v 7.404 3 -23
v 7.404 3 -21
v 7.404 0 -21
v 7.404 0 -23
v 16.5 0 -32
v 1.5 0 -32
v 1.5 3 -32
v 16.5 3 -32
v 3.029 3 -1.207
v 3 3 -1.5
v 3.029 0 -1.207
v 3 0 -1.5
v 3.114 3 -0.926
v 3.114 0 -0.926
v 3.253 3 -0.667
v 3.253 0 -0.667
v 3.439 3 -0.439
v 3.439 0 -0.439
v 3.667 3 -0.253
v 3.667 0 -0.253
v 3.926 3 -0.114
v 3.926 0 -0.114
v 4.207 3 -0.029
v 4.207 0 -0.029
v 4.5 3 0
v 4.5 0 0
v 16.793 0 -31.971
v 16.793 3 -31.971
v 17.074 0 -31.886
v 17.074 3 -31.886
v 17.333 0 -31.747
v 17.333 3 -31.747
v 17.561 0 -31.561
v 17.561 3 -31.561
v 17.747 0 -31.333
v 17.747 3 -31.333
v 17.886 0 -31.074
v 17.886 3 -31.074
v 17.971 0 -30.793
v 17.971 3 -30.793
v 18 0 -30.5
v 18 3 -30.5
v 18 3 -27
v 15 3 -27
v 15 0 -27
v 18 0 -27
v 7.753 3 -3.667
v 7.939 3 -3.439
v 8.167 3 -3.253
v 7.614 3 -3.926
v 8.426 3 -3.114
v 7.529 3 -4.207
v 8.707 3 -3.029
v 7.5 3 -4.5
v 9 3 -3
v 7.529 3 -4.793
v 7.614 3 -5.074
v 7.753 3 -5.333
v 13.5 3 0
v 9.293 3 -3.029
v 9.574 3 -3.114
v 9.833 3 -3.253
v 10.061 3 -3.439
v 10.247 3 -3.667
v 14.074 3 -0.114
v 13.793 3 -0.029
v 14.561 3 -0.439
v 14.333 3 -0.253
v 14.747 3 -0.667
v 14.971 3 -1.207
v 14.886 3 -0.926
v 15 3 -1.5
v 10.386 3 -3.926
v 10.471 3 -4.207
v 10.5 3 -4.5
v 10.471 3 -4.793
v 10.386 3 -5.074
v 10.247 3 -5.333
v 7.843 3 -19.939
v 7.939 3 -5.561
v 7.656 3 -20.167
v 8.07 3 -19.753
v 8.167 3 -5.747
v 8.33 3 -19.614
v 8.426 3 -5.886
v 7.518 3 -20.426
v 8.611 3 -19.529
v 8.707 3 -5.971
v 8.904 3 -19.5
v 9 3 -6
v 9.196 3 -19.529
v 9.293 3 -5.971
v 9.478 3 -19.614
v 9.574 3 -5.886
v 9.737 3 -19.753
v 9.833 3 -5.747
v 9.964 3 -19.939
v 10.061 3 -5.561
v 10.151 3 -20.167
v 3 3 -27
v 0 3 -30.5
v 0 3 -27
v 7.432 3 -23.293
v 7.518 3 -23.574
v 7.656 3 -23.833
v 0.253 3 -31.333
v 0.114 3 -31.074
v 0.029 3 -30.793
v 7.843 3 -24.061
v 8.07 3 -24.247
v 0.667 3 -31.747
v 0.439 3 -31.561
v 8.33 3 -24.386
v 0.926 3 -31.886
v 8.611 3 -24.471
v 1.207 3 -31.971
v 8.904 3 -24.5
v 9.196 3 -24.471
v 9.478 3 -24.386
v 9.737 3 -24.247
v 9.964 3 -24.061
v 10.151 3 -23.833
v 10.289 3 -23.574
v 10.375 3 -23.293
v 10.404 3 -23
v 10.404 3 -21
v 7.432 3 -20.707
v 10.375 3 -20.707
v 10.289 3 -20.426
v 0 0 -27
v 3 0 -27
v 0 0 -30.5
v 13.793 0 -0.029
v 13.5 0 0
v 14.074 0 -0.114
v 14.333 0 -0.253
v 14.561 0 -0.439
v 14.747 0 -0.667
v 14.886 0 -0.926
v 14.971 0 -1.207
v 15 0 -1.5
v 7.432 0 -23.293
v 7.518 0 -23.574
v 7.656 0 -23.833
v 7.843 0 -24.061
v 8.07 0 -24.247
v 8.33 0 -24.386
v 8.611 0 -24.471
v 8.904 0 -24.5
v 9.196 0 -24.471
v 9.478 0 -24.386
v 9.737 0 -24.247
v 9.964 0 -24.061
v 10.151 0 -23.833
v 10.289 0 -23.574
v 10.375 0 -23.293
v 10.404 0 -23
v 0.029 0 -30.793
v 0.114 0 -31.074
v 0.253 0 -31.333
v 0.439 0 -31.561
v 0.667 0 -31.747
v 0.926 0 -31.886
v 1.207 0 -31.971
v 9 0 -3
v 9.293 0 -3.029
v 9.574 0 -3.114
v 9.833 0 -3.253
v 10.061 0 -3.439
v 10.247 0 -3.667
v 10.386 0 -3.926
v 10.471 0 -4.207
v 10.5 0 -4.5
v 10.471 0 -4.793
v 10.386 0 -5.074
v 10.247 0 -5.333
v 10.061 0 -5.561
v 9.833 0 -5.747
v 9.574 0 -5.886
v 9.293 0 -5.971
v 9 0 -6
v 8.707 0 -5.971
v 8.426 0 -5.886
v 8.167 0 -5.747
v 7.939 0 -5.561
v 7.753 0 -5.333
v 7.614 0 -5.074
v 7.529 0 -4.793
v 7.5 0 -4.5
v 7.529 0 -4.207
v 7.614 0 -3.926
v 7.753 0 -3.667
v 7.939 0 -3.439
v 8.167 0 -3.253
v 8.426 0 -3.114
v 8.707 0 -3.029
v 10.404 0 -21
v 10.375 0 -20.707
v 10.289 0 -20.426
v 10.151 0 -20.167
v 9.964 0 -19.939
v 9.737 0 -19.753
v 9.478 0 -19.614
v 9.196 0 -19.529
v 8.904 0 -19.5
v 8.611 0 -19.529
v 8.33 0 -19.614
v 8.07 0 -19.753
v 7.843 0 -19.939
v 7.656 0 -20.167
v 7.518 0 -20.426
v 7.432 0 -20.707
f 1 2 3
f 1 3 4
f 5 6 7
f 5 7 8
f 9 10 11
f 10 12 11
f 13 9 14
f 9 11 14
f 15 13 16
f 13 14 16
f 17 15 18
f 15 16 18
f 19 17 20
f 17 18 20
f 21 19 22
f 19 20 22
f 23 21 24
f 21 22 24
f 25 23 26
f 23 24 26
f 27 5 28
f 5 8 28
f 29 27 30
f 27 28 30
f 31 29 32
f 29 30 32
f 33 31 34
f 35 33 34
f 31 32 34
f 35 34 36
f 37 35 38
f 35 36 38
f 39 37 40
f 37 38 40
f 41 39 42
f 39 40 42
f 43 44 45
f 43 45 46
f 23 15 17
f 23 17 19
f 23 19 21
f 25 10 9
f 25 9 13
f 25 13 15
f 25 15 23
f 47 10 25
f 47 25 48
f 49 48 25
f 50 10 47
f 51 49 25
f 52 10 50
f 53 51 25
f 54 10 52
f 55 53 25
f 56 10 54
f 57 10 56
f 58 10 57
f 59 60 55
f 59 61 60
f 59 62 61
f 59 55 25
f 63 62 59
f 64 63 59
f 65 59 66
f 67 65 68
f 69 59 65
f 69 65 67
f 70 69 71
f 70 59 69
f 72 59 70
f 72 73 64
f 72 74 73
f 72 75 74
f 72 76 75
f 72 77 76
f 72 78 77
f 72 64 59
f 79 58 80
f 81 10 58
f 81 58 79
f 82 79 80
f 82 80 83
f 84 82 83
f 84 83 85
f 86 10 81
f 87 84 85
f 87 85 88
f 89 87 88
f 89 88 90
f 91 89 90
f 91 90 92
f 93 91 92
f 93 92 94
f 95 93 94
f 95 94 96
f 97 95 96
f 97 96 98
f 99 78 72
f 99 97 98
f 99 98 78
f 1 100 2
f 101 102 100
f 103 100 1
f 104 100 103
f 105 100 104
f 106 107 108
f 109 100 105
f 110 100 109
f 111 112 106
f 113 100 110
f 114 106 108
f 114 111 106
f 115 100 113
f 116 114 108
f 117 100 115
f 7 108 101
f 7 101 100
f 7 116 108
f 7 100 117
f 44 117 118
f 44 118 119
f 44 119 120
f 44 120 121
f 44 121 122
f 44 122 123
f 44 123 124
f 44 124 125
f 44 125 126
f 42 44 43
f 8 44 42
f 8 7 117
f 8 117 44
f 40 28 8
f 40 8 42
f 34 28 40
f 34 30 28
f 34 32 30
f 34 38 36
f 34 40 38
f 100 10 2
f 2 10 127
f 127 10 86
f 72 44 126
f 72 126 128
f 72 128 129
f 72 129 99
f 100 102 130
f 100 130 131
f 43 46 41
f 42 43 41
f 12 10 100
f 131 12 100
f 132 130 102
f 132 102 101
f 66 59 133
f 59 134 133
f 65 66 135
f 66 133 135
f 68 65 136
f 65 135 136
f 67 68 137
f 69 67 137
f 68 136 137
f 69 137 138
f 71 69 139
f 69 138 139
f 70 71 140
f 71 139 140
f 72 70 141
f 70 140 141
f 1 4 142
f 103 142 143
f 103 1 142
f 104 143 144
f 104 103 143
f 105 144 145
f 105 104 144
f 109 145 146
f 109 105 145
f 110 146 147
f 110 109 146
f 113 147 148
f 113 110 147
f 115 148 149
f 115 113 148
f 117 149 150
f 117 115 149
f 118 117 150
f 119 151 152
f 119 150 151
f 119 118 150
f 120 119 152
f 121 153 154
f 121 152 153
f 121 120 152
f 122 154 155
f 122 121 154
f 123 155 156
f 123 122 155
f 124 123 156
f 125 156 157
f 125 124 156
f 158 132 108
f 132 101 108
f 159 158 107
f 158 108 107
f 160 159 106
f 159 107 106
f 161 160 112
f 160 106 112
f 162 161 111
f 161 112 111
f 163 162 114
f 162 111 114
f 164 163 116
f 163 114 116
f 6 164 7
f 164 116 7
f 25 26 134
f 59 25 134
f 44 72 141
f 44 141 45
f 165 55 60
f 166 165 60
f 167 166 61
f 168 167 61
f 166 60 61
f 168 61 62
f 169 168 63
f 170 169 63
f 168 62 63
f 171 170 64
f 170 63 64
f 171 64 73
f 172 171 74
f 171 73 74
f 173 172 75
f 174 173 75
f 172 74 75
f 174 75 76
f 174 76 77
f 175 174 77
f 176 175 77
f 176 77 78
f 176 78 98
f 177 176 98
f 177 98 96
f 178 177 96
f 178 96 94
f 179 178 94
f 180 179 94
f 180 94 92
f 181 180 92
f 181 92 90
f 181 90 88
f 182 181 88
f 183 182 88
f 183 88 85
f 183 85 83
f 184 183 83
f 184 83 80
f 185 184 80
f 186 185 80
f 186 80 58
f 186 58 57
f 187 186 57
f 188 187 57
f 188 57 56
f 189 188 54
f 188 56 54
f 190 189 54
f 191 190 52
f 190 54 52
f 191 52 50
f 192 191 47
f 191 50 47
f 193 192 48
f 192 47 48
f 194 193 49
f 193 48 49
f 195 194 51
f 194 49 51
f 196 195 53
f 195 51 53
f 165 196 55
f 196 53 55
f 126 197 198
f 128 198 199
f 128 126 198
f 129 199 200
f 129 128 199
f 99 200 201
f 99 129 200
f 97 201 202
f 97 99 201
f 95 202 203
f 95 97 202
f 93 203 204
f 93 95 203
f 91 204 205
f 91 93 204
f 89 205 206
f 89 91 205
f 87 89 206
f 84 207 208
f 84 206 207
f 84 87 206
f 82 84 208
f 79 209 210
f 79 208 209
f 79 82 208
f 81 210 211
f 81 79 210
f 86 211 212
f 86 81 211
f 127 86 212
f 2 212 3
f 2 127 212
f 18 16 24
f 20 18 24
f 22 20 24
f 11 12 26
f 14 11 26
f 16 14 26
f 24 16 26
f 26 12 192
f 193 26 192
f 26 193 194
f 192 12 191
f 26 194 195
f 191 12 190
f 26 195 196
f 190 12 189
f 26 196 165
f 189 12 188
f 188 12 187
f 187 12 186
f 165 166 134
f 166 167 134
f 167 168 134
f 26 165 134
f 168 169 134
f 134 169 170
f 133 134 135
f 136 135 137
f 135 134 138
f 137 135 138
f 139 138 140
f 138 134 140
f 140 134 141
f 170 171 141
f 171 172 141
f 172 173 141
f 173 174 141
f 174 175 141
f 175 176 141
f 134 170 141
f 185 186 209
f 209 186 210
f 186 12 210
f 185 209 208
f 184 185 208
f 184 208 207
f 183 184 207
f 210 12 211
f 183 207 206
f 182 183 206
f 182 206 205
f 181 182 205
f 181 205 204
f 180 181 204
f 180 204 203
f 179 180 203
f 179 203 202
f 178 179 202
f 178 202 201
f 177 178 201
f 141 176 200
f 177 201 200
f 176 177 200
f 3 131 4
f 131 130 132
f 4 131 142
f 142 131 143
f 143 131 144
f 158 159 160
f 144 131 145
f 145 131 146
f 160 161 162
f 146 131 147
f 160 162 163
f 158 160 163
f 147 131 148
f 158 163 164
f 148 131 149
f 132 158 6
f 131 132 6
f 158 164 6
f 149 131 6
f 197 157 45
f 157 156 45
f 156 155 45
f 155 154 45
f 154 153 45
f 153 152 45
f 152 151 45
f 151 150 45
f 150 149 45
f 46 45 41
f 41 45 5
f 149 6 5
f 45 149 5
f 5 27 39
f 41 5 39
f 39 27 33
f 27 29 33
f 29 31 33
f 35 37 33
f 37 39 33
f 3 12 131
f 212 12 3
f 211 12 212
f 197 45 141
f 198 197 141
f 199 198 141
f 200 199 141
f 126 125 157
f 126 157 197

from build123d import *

# Parameters (mm, degrees)
ESQUISSE1_W             = 18
ESQUISSE1_H             = 32
BOSS_EXTRU_1_DEPTH      = 3
ENL_V_MAT_EXTRU_1_REACH = 38.837
ESQUISSE2_W             = 3
ESQUISSE2_H             = 27
ENL_V_MAT_EXTRU_2_REACH = 38.837
ESQUISSE3_W             = 3
ESQUISSE3_H             = 27
ENL_V_MAT_EXTRU_3_REACH = 38.837
ESQUISSE4_R             = 1.5
CONG_1_R                = 1.5
CONG_2_R                = 1.5
ENL_V_MAT_EXTRU_4_REACH = 38.837


with BuildPart() as part:
    # Esquisse1 → Boss.-Extru.1 (new body)
    with BuildSketch(Plane(origin=(0, 0, 0), x_dir=(1, 0, 0), z_dir=(0, 1, 0))):
        with Locations((9, 16)):
            Rectangle(ESQUISSE1_W, ESQUISSE1_H)
    extrude(amount=BOSS_EXTRU_1_DEPTH)

    # Esquisse2 → Enlèv. mat.-Extru.1 (cut, up to next)
    with BuildSketch(Plane(origin=(0, 3, 0), x_dir=(1, 0, 0), z_dir=(0, 1, 0)), mode=Mode.PRIVATE) as enl_v_mat_extru_1_sk1:
        with Locations((1.5, 13.5)):
            Rectangle(ESQUISSE2_W, ESQUISSE2_H)
    enl_v_mat_extru_1_tool1 = extrude(enl_v_mat_extru_1_sk1.sketch, amount=-ENL_V_MAT_EXTRU_1_REACH, mode=Mode.PRIVATE) & part.part
    add(enl_v_mat_extru_1_tool1.solids().sort_by_distance((1.5, 3, -13.5))[0], mode=Mode.SUBTRACT)

    # Esquisse3 → Enlèv. mat.-Extru.2 (cut, up to next)
    with BuildSketch(Plane(origin=(0, 3, 0), x_dir=(1, 0, 0), z_dir=(0, 1, 0)), mode=Mode.PRIVATE) as enl_v_mat_extru_2_sk1:
        with Locations((16.5, 13.5)):
            Rectangle(ESQUISSE3_W, ESQUISSE3_H)
    enl_v_mat_extru_2_tool1 = extrude(enl_v_mat_extru_2_sk1.sketch, amount=-ENL_V_MAT_EXTRU_2_REACH, mode=Mode.PRIVATE) & part.part
    add(enl_v_mat_extru_2_tool1.solids().sort_by_distance((16.5, 3, -13.5))[0], mode=Mode.SUBTRACT)

    # Esquisse4 → Enlèv. mat.-Extru.3 (cut, up to next)
    with BuildSketch(Plane(origin=(0, 3, 0), x_dir=(1, 0, 0), z_dir=(0, 1, 0)), mode=Mode.PRIVATE) as enl_v_mat_extru_3_sk1:
        with Locations(Location((9, 4.5, 0), (0, 0, 270))):
            Circle(ESQUISSE4_R)
    enl_v_mat_extru_3_tool1 = extrude(enl_v_mat_extru_3_sk1.sketch, amount=-ENL_V_MAT_EXTRU_3_REACH, mode=Mode.PRIVATE) & part.part
    add(enl_v_mat_extru_3_tool1.solids().sort_by_distance((9, 3, -4.5))[0], mode=Mode.SUBTRACT)

    # Congé1
    cong_1_edges = [part.edges().sort_by_distance(p)[0] for p in [
        (0, 1.5, -32),
        (18, 1.5, -32),
    ]]
    fillet(cong_1_edges, radius=CONG_1_R)

    # Congé2
    cong_2_edges = [part.edges().sort_by_distance(p)[0] for p in [
        (3, 1.5, 0),
        (15, 1.5, 0),
    ]]
    fillet(cong_2_edges, radius=CONG_2_R)

    # Esquisse5 → Enlèv. mat.-Extru.4 (cut, up to next)
    with BuildSketch(Plane(origin=(0, 3, 0), x_dir=(1, 0, 0), z_dir=(0, 1, 0)), mode=Mode.PRIVATE) as enl_v_mat_extru_4_sk1:
        with BuildLine():
            Line((10.403583012, 23), (10.403583012, 21))
            ThreePointArc((10.403583012, 21), (8.903583012, 19.5), (7.403583012, 21))
            Line((7.403583012, 21), (7.403583012, 23))
            ThreePointArc((7.403583012, 23), (8.903583012, 24.5), (10.403583012, 23))
        make_face()
    enl_v_mat_extru_4_tool1 = extrude(enl_v_mat_extru_4_sk1.sketch, amount=-ENL_V_MAT_EXTRU_4_REACH, mode=Mode.PRIVATE) & part.part
    add(enl_v_mat_extru_4_tool1.solids().sort_by_distance((8.903583, 3, -22))[0], mode=Mode.SUBTRACT)


solid = part.part
